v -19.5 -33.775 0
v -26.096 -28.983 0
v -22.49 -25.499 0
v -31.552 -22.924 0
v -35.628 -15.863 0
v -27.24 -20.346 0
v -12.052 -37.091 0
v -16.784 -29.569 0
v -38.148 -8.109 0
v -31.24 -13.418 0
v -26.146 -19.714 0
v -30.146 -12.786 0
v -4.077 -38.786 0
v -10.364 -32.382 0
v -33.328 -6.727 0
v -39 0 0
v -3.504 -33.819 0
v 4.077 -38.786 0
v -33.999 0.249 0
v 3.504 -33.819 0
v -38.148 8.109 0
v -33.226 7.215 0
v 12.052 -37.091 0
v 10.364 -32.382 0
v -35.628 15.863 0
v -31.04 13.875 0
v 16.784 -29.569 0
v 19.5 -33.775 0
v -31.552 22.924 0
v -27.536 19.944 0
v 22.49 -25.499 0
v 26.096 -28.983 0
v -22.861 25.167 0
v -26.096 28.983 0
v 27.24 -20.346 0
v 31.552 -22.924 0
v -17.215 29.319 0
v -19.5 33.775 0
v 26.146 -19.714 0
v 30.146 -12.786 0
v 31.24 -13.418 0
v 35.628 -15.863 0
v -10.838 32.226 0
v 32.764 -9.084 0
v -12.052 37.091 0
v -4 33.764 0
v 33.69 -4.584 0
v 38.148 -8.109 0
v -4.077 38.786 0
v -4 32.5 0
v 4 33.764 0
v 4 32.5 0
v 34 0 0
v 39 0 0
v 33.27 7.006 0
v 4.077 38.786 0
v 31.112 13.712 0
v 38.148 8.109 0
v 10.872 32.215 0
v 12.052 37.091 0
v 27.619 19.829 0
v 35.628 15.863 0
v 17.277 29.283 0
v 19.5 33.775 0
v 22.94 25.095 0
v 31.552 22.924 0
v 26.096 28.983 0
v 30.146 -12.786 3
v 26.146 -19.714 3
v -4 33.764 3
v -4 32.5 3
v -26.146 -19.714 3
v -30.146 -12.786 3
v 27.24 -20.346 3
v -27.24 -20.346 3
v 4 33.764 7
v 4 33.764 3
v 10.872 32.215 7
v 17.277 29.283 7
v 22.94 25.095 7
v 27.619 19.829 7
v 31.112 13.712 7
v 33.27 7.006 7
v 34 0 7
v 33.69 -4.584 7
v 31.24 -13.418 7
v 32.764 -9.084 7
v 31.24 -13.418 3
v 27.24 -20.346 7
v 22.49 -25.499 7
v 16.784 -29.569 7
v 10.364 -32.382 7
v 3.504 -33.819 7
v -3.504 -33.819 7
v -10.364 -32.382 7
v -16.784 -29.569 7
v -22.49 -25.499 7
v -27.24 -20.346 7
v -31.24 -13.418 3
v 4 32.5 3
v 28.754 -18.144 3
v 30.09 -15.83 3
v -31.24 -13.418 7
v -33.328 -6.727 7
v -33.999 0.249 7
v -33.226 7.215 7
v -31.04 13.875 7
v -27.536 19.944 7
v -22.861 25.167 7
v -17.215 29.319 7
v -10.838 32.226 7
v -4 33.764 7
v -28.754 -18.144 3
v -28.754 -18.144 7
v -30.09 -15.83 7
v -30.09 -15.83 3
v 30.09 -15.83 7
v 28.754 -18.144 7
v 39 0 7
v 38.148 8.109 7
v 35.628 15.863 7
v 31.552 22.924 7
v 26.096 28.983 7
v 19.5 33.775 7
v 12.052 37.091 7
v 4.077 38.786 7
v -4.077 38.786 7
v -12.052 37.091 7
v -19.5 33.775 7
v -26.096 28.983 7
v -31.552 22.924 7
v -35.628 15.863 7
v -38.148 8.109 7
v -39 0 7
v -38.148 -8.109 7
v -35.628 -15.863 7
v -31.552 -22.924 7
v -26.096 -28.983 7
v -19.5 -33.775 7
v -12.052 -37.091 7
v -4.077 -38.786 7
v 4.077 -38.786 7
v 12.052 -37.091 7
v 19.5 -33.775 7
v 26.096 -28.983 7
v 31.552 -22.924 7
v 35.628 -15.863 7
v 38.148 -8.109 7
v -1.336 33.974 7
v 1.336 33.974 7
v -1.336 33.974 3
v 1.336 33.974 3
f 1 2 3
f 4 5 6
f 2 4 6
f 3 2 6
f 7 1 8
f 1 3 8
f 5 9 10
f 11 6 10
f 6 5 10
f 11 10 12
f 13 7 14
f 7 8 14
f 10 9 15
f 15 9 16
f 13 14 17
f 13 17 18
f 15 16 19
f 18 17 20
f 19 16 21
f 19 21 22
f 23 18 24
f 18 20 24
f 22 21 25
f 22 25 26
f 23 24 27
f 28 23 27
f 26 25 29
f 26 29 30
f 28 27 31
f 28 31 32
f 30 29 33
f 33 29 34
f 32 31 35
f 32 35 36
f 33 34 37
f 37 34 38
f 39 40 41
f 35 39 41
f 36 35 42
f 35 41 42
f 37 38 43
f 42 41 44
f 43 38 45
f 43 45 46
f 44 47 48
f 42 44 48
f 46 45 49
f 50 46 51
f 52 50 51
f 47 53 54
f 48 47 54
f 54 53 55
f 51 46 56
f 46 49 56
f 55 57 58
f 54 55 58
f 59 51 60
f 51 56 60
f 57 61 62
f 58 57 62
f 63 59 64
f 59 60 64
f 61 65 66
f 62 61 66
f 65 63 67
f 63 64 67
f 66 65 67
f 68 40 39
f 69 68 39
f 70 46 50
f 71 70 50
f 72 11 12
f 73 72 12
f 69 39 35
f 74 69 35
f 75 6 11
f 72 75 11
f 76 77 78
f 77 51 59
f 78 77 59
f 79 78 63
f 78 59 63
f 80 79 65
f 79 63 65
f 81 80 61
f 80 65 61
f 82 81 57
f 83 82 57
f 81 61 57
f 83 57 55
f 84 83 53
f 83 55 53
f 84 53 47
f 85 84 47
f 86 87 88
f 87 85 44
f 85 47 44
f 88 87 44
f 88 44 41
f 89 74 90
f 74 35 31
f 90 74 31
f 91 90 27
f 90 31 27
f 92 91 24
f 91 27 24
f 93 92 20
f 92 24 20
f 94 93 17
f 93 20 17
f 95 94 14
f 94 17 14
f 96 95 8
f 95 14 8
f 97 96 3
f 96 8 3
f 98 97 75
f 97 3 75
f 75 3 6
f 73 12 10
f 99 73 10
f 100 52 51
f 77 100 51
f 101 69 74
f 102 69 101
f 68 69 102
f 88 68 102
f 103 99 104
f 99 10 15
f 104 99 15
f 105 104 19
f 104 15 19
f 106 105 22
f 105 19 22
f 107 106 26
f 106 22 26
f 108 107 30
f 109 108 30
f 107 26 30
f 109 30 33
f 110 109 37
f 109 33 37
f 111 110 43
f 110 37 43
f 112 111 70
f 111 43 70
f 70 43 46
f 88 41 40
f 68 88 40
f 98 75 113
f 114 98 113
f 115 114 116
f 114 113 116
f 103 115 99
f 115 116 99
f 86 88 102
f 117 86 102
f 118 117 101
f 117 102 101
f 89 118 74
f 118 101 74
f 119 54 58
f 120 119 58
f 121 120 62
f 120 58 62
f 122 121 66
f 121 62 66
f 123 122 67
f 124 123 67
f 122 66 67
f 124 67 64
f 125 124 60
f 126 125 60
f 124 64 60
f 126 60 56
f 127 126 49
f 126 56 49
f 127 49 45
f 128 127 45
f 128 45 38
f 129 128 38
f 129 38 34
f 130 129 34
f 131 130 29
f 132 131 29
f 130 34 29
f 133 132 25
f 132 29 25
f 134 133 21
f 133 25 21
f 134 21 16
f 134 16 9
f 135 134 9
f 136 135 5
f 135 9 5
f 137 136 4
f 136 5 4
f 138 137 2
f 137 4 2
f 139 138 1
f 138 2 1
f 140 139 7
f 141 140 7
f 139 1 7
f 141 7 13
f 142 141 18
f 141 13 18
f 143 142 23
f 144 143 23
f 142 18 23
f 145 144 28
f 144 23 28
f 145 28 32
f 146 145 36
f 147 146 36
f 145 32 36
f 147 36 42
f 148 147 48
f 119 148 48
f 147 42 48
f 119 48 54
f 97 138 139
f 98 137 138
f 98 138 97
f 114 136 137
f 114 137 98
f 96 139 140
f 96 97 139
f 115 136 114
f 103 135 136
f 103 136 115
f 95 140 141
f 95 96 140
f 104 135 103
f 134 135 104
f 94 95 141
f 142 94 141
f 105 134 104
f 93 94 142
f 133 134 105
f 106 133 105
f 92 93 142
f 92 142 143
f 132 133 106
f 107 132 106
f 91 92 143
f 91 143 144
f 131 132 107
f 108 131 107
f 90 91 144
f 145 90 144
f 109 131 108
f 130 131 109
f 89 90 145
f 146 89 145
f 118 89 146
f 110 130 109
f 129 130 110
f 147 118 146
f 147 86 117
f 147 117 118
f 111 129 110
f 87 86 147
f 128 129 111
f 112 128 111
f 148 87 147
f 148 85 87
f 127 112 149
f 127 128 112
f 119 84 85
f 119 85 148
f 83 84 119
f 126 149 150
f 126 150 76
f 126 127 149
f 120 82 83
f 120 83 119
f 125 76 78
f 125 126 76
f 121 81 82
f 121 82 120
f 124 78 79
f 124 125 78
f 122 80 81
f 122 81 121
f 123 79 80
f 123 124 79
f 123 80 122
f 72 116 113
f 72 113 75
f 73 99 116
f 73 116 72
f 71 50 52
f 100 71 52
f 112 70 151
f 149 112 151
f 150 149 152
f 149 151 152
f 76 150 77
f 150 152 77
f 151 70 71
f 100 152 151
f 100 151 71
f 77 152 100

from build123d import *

# Parameters (mm, degrees)
F0_R     = 39
F1_DEPTH = 7
F2_DEPTH = 3
F3_DEPTH = 3
F4_DEPTH = 3


with BuildPart() as f1:
    # F0 (on Top) → F1 (new body)
    with BuildSketch(Plane.XY):
        Circle(F0_R)
        with BuildLine():
            ThreePointArc((4, 33.763886), (25.41653, 22.58318), (34, 0))
            ThreePointArc((34, 0), (33.30295, -6.849342), (31.240383, -13.417841))
            ThreePointArc((31.240383, -13.417841), (29.444864, -17), (27.240383, -20.346045))
            ThreePointArc((27.240383, -20.346045), (0, -34), (-27.240383, -20.346045))
            ThreePointArc((-27.240383, -20.346045), (-29.444864, -17), (-31.240383, -13.417841))
            ThreePointArc((-31.240383, -13.417841), (-29.444864, 17), (-4, 33.763886))
            ThreePointArc((-4, 33.763886), (0, 34), (4, 33.763886))
        make_face(mode=Mode.SUBTRACT)
    extrude(amount=F1_DEPTH)

    # F0 (on Top) → F2 (join)
    with BuildSketch(Plane.XY):
        with BuildLine():
            Line((4, 32.5), (4, 33.763886))
            ThreePointArc((4, 33.763886), (0, 34), (-4, 33.763886))
            Line((-4, 33.763886), (-4, 32.5))
            Line((-4, 32.5), (4, 32.5))
        make_face()
    extrude(amount=F2_DEPTH)

    # F0 (on Top) → F3 (join)
    with BuildSketch(Plane.XY):
        with BuildLine():
            ThreePointArc((27.240383, -20.346045), (29.444864, -17), (31.240383, -13.417841))
            Line((31.240383, -13.417841), (30.145826, -12.785898))
            Line((30.145826, -12.785898), (26.145826, -19.714102))
            Line((26.145826, -19.714102), (27.240383, -20.346045))
        make_face()
    extrude(amount=F3_DEPTH)

    # F0 (on Top) → F4 (join)
    with BuildSketch(Plane.XY):
        with BuildLine():
            Line((-30.145826, -12.785898), (-31.240383, -13.417841))
            ThreePointArc((-31.240383, -13.417841), (-29.444864, -17), (-27.240383, -20.346045))
            Line((-27.240383, -20.346045), (-26.145826, -19.714102))
            Line((-26.145826, -19.714102), (-30.145826, -12.785898))
        make_face()
    extrude(amount=F4_DEPTH)


solid = f1.part
